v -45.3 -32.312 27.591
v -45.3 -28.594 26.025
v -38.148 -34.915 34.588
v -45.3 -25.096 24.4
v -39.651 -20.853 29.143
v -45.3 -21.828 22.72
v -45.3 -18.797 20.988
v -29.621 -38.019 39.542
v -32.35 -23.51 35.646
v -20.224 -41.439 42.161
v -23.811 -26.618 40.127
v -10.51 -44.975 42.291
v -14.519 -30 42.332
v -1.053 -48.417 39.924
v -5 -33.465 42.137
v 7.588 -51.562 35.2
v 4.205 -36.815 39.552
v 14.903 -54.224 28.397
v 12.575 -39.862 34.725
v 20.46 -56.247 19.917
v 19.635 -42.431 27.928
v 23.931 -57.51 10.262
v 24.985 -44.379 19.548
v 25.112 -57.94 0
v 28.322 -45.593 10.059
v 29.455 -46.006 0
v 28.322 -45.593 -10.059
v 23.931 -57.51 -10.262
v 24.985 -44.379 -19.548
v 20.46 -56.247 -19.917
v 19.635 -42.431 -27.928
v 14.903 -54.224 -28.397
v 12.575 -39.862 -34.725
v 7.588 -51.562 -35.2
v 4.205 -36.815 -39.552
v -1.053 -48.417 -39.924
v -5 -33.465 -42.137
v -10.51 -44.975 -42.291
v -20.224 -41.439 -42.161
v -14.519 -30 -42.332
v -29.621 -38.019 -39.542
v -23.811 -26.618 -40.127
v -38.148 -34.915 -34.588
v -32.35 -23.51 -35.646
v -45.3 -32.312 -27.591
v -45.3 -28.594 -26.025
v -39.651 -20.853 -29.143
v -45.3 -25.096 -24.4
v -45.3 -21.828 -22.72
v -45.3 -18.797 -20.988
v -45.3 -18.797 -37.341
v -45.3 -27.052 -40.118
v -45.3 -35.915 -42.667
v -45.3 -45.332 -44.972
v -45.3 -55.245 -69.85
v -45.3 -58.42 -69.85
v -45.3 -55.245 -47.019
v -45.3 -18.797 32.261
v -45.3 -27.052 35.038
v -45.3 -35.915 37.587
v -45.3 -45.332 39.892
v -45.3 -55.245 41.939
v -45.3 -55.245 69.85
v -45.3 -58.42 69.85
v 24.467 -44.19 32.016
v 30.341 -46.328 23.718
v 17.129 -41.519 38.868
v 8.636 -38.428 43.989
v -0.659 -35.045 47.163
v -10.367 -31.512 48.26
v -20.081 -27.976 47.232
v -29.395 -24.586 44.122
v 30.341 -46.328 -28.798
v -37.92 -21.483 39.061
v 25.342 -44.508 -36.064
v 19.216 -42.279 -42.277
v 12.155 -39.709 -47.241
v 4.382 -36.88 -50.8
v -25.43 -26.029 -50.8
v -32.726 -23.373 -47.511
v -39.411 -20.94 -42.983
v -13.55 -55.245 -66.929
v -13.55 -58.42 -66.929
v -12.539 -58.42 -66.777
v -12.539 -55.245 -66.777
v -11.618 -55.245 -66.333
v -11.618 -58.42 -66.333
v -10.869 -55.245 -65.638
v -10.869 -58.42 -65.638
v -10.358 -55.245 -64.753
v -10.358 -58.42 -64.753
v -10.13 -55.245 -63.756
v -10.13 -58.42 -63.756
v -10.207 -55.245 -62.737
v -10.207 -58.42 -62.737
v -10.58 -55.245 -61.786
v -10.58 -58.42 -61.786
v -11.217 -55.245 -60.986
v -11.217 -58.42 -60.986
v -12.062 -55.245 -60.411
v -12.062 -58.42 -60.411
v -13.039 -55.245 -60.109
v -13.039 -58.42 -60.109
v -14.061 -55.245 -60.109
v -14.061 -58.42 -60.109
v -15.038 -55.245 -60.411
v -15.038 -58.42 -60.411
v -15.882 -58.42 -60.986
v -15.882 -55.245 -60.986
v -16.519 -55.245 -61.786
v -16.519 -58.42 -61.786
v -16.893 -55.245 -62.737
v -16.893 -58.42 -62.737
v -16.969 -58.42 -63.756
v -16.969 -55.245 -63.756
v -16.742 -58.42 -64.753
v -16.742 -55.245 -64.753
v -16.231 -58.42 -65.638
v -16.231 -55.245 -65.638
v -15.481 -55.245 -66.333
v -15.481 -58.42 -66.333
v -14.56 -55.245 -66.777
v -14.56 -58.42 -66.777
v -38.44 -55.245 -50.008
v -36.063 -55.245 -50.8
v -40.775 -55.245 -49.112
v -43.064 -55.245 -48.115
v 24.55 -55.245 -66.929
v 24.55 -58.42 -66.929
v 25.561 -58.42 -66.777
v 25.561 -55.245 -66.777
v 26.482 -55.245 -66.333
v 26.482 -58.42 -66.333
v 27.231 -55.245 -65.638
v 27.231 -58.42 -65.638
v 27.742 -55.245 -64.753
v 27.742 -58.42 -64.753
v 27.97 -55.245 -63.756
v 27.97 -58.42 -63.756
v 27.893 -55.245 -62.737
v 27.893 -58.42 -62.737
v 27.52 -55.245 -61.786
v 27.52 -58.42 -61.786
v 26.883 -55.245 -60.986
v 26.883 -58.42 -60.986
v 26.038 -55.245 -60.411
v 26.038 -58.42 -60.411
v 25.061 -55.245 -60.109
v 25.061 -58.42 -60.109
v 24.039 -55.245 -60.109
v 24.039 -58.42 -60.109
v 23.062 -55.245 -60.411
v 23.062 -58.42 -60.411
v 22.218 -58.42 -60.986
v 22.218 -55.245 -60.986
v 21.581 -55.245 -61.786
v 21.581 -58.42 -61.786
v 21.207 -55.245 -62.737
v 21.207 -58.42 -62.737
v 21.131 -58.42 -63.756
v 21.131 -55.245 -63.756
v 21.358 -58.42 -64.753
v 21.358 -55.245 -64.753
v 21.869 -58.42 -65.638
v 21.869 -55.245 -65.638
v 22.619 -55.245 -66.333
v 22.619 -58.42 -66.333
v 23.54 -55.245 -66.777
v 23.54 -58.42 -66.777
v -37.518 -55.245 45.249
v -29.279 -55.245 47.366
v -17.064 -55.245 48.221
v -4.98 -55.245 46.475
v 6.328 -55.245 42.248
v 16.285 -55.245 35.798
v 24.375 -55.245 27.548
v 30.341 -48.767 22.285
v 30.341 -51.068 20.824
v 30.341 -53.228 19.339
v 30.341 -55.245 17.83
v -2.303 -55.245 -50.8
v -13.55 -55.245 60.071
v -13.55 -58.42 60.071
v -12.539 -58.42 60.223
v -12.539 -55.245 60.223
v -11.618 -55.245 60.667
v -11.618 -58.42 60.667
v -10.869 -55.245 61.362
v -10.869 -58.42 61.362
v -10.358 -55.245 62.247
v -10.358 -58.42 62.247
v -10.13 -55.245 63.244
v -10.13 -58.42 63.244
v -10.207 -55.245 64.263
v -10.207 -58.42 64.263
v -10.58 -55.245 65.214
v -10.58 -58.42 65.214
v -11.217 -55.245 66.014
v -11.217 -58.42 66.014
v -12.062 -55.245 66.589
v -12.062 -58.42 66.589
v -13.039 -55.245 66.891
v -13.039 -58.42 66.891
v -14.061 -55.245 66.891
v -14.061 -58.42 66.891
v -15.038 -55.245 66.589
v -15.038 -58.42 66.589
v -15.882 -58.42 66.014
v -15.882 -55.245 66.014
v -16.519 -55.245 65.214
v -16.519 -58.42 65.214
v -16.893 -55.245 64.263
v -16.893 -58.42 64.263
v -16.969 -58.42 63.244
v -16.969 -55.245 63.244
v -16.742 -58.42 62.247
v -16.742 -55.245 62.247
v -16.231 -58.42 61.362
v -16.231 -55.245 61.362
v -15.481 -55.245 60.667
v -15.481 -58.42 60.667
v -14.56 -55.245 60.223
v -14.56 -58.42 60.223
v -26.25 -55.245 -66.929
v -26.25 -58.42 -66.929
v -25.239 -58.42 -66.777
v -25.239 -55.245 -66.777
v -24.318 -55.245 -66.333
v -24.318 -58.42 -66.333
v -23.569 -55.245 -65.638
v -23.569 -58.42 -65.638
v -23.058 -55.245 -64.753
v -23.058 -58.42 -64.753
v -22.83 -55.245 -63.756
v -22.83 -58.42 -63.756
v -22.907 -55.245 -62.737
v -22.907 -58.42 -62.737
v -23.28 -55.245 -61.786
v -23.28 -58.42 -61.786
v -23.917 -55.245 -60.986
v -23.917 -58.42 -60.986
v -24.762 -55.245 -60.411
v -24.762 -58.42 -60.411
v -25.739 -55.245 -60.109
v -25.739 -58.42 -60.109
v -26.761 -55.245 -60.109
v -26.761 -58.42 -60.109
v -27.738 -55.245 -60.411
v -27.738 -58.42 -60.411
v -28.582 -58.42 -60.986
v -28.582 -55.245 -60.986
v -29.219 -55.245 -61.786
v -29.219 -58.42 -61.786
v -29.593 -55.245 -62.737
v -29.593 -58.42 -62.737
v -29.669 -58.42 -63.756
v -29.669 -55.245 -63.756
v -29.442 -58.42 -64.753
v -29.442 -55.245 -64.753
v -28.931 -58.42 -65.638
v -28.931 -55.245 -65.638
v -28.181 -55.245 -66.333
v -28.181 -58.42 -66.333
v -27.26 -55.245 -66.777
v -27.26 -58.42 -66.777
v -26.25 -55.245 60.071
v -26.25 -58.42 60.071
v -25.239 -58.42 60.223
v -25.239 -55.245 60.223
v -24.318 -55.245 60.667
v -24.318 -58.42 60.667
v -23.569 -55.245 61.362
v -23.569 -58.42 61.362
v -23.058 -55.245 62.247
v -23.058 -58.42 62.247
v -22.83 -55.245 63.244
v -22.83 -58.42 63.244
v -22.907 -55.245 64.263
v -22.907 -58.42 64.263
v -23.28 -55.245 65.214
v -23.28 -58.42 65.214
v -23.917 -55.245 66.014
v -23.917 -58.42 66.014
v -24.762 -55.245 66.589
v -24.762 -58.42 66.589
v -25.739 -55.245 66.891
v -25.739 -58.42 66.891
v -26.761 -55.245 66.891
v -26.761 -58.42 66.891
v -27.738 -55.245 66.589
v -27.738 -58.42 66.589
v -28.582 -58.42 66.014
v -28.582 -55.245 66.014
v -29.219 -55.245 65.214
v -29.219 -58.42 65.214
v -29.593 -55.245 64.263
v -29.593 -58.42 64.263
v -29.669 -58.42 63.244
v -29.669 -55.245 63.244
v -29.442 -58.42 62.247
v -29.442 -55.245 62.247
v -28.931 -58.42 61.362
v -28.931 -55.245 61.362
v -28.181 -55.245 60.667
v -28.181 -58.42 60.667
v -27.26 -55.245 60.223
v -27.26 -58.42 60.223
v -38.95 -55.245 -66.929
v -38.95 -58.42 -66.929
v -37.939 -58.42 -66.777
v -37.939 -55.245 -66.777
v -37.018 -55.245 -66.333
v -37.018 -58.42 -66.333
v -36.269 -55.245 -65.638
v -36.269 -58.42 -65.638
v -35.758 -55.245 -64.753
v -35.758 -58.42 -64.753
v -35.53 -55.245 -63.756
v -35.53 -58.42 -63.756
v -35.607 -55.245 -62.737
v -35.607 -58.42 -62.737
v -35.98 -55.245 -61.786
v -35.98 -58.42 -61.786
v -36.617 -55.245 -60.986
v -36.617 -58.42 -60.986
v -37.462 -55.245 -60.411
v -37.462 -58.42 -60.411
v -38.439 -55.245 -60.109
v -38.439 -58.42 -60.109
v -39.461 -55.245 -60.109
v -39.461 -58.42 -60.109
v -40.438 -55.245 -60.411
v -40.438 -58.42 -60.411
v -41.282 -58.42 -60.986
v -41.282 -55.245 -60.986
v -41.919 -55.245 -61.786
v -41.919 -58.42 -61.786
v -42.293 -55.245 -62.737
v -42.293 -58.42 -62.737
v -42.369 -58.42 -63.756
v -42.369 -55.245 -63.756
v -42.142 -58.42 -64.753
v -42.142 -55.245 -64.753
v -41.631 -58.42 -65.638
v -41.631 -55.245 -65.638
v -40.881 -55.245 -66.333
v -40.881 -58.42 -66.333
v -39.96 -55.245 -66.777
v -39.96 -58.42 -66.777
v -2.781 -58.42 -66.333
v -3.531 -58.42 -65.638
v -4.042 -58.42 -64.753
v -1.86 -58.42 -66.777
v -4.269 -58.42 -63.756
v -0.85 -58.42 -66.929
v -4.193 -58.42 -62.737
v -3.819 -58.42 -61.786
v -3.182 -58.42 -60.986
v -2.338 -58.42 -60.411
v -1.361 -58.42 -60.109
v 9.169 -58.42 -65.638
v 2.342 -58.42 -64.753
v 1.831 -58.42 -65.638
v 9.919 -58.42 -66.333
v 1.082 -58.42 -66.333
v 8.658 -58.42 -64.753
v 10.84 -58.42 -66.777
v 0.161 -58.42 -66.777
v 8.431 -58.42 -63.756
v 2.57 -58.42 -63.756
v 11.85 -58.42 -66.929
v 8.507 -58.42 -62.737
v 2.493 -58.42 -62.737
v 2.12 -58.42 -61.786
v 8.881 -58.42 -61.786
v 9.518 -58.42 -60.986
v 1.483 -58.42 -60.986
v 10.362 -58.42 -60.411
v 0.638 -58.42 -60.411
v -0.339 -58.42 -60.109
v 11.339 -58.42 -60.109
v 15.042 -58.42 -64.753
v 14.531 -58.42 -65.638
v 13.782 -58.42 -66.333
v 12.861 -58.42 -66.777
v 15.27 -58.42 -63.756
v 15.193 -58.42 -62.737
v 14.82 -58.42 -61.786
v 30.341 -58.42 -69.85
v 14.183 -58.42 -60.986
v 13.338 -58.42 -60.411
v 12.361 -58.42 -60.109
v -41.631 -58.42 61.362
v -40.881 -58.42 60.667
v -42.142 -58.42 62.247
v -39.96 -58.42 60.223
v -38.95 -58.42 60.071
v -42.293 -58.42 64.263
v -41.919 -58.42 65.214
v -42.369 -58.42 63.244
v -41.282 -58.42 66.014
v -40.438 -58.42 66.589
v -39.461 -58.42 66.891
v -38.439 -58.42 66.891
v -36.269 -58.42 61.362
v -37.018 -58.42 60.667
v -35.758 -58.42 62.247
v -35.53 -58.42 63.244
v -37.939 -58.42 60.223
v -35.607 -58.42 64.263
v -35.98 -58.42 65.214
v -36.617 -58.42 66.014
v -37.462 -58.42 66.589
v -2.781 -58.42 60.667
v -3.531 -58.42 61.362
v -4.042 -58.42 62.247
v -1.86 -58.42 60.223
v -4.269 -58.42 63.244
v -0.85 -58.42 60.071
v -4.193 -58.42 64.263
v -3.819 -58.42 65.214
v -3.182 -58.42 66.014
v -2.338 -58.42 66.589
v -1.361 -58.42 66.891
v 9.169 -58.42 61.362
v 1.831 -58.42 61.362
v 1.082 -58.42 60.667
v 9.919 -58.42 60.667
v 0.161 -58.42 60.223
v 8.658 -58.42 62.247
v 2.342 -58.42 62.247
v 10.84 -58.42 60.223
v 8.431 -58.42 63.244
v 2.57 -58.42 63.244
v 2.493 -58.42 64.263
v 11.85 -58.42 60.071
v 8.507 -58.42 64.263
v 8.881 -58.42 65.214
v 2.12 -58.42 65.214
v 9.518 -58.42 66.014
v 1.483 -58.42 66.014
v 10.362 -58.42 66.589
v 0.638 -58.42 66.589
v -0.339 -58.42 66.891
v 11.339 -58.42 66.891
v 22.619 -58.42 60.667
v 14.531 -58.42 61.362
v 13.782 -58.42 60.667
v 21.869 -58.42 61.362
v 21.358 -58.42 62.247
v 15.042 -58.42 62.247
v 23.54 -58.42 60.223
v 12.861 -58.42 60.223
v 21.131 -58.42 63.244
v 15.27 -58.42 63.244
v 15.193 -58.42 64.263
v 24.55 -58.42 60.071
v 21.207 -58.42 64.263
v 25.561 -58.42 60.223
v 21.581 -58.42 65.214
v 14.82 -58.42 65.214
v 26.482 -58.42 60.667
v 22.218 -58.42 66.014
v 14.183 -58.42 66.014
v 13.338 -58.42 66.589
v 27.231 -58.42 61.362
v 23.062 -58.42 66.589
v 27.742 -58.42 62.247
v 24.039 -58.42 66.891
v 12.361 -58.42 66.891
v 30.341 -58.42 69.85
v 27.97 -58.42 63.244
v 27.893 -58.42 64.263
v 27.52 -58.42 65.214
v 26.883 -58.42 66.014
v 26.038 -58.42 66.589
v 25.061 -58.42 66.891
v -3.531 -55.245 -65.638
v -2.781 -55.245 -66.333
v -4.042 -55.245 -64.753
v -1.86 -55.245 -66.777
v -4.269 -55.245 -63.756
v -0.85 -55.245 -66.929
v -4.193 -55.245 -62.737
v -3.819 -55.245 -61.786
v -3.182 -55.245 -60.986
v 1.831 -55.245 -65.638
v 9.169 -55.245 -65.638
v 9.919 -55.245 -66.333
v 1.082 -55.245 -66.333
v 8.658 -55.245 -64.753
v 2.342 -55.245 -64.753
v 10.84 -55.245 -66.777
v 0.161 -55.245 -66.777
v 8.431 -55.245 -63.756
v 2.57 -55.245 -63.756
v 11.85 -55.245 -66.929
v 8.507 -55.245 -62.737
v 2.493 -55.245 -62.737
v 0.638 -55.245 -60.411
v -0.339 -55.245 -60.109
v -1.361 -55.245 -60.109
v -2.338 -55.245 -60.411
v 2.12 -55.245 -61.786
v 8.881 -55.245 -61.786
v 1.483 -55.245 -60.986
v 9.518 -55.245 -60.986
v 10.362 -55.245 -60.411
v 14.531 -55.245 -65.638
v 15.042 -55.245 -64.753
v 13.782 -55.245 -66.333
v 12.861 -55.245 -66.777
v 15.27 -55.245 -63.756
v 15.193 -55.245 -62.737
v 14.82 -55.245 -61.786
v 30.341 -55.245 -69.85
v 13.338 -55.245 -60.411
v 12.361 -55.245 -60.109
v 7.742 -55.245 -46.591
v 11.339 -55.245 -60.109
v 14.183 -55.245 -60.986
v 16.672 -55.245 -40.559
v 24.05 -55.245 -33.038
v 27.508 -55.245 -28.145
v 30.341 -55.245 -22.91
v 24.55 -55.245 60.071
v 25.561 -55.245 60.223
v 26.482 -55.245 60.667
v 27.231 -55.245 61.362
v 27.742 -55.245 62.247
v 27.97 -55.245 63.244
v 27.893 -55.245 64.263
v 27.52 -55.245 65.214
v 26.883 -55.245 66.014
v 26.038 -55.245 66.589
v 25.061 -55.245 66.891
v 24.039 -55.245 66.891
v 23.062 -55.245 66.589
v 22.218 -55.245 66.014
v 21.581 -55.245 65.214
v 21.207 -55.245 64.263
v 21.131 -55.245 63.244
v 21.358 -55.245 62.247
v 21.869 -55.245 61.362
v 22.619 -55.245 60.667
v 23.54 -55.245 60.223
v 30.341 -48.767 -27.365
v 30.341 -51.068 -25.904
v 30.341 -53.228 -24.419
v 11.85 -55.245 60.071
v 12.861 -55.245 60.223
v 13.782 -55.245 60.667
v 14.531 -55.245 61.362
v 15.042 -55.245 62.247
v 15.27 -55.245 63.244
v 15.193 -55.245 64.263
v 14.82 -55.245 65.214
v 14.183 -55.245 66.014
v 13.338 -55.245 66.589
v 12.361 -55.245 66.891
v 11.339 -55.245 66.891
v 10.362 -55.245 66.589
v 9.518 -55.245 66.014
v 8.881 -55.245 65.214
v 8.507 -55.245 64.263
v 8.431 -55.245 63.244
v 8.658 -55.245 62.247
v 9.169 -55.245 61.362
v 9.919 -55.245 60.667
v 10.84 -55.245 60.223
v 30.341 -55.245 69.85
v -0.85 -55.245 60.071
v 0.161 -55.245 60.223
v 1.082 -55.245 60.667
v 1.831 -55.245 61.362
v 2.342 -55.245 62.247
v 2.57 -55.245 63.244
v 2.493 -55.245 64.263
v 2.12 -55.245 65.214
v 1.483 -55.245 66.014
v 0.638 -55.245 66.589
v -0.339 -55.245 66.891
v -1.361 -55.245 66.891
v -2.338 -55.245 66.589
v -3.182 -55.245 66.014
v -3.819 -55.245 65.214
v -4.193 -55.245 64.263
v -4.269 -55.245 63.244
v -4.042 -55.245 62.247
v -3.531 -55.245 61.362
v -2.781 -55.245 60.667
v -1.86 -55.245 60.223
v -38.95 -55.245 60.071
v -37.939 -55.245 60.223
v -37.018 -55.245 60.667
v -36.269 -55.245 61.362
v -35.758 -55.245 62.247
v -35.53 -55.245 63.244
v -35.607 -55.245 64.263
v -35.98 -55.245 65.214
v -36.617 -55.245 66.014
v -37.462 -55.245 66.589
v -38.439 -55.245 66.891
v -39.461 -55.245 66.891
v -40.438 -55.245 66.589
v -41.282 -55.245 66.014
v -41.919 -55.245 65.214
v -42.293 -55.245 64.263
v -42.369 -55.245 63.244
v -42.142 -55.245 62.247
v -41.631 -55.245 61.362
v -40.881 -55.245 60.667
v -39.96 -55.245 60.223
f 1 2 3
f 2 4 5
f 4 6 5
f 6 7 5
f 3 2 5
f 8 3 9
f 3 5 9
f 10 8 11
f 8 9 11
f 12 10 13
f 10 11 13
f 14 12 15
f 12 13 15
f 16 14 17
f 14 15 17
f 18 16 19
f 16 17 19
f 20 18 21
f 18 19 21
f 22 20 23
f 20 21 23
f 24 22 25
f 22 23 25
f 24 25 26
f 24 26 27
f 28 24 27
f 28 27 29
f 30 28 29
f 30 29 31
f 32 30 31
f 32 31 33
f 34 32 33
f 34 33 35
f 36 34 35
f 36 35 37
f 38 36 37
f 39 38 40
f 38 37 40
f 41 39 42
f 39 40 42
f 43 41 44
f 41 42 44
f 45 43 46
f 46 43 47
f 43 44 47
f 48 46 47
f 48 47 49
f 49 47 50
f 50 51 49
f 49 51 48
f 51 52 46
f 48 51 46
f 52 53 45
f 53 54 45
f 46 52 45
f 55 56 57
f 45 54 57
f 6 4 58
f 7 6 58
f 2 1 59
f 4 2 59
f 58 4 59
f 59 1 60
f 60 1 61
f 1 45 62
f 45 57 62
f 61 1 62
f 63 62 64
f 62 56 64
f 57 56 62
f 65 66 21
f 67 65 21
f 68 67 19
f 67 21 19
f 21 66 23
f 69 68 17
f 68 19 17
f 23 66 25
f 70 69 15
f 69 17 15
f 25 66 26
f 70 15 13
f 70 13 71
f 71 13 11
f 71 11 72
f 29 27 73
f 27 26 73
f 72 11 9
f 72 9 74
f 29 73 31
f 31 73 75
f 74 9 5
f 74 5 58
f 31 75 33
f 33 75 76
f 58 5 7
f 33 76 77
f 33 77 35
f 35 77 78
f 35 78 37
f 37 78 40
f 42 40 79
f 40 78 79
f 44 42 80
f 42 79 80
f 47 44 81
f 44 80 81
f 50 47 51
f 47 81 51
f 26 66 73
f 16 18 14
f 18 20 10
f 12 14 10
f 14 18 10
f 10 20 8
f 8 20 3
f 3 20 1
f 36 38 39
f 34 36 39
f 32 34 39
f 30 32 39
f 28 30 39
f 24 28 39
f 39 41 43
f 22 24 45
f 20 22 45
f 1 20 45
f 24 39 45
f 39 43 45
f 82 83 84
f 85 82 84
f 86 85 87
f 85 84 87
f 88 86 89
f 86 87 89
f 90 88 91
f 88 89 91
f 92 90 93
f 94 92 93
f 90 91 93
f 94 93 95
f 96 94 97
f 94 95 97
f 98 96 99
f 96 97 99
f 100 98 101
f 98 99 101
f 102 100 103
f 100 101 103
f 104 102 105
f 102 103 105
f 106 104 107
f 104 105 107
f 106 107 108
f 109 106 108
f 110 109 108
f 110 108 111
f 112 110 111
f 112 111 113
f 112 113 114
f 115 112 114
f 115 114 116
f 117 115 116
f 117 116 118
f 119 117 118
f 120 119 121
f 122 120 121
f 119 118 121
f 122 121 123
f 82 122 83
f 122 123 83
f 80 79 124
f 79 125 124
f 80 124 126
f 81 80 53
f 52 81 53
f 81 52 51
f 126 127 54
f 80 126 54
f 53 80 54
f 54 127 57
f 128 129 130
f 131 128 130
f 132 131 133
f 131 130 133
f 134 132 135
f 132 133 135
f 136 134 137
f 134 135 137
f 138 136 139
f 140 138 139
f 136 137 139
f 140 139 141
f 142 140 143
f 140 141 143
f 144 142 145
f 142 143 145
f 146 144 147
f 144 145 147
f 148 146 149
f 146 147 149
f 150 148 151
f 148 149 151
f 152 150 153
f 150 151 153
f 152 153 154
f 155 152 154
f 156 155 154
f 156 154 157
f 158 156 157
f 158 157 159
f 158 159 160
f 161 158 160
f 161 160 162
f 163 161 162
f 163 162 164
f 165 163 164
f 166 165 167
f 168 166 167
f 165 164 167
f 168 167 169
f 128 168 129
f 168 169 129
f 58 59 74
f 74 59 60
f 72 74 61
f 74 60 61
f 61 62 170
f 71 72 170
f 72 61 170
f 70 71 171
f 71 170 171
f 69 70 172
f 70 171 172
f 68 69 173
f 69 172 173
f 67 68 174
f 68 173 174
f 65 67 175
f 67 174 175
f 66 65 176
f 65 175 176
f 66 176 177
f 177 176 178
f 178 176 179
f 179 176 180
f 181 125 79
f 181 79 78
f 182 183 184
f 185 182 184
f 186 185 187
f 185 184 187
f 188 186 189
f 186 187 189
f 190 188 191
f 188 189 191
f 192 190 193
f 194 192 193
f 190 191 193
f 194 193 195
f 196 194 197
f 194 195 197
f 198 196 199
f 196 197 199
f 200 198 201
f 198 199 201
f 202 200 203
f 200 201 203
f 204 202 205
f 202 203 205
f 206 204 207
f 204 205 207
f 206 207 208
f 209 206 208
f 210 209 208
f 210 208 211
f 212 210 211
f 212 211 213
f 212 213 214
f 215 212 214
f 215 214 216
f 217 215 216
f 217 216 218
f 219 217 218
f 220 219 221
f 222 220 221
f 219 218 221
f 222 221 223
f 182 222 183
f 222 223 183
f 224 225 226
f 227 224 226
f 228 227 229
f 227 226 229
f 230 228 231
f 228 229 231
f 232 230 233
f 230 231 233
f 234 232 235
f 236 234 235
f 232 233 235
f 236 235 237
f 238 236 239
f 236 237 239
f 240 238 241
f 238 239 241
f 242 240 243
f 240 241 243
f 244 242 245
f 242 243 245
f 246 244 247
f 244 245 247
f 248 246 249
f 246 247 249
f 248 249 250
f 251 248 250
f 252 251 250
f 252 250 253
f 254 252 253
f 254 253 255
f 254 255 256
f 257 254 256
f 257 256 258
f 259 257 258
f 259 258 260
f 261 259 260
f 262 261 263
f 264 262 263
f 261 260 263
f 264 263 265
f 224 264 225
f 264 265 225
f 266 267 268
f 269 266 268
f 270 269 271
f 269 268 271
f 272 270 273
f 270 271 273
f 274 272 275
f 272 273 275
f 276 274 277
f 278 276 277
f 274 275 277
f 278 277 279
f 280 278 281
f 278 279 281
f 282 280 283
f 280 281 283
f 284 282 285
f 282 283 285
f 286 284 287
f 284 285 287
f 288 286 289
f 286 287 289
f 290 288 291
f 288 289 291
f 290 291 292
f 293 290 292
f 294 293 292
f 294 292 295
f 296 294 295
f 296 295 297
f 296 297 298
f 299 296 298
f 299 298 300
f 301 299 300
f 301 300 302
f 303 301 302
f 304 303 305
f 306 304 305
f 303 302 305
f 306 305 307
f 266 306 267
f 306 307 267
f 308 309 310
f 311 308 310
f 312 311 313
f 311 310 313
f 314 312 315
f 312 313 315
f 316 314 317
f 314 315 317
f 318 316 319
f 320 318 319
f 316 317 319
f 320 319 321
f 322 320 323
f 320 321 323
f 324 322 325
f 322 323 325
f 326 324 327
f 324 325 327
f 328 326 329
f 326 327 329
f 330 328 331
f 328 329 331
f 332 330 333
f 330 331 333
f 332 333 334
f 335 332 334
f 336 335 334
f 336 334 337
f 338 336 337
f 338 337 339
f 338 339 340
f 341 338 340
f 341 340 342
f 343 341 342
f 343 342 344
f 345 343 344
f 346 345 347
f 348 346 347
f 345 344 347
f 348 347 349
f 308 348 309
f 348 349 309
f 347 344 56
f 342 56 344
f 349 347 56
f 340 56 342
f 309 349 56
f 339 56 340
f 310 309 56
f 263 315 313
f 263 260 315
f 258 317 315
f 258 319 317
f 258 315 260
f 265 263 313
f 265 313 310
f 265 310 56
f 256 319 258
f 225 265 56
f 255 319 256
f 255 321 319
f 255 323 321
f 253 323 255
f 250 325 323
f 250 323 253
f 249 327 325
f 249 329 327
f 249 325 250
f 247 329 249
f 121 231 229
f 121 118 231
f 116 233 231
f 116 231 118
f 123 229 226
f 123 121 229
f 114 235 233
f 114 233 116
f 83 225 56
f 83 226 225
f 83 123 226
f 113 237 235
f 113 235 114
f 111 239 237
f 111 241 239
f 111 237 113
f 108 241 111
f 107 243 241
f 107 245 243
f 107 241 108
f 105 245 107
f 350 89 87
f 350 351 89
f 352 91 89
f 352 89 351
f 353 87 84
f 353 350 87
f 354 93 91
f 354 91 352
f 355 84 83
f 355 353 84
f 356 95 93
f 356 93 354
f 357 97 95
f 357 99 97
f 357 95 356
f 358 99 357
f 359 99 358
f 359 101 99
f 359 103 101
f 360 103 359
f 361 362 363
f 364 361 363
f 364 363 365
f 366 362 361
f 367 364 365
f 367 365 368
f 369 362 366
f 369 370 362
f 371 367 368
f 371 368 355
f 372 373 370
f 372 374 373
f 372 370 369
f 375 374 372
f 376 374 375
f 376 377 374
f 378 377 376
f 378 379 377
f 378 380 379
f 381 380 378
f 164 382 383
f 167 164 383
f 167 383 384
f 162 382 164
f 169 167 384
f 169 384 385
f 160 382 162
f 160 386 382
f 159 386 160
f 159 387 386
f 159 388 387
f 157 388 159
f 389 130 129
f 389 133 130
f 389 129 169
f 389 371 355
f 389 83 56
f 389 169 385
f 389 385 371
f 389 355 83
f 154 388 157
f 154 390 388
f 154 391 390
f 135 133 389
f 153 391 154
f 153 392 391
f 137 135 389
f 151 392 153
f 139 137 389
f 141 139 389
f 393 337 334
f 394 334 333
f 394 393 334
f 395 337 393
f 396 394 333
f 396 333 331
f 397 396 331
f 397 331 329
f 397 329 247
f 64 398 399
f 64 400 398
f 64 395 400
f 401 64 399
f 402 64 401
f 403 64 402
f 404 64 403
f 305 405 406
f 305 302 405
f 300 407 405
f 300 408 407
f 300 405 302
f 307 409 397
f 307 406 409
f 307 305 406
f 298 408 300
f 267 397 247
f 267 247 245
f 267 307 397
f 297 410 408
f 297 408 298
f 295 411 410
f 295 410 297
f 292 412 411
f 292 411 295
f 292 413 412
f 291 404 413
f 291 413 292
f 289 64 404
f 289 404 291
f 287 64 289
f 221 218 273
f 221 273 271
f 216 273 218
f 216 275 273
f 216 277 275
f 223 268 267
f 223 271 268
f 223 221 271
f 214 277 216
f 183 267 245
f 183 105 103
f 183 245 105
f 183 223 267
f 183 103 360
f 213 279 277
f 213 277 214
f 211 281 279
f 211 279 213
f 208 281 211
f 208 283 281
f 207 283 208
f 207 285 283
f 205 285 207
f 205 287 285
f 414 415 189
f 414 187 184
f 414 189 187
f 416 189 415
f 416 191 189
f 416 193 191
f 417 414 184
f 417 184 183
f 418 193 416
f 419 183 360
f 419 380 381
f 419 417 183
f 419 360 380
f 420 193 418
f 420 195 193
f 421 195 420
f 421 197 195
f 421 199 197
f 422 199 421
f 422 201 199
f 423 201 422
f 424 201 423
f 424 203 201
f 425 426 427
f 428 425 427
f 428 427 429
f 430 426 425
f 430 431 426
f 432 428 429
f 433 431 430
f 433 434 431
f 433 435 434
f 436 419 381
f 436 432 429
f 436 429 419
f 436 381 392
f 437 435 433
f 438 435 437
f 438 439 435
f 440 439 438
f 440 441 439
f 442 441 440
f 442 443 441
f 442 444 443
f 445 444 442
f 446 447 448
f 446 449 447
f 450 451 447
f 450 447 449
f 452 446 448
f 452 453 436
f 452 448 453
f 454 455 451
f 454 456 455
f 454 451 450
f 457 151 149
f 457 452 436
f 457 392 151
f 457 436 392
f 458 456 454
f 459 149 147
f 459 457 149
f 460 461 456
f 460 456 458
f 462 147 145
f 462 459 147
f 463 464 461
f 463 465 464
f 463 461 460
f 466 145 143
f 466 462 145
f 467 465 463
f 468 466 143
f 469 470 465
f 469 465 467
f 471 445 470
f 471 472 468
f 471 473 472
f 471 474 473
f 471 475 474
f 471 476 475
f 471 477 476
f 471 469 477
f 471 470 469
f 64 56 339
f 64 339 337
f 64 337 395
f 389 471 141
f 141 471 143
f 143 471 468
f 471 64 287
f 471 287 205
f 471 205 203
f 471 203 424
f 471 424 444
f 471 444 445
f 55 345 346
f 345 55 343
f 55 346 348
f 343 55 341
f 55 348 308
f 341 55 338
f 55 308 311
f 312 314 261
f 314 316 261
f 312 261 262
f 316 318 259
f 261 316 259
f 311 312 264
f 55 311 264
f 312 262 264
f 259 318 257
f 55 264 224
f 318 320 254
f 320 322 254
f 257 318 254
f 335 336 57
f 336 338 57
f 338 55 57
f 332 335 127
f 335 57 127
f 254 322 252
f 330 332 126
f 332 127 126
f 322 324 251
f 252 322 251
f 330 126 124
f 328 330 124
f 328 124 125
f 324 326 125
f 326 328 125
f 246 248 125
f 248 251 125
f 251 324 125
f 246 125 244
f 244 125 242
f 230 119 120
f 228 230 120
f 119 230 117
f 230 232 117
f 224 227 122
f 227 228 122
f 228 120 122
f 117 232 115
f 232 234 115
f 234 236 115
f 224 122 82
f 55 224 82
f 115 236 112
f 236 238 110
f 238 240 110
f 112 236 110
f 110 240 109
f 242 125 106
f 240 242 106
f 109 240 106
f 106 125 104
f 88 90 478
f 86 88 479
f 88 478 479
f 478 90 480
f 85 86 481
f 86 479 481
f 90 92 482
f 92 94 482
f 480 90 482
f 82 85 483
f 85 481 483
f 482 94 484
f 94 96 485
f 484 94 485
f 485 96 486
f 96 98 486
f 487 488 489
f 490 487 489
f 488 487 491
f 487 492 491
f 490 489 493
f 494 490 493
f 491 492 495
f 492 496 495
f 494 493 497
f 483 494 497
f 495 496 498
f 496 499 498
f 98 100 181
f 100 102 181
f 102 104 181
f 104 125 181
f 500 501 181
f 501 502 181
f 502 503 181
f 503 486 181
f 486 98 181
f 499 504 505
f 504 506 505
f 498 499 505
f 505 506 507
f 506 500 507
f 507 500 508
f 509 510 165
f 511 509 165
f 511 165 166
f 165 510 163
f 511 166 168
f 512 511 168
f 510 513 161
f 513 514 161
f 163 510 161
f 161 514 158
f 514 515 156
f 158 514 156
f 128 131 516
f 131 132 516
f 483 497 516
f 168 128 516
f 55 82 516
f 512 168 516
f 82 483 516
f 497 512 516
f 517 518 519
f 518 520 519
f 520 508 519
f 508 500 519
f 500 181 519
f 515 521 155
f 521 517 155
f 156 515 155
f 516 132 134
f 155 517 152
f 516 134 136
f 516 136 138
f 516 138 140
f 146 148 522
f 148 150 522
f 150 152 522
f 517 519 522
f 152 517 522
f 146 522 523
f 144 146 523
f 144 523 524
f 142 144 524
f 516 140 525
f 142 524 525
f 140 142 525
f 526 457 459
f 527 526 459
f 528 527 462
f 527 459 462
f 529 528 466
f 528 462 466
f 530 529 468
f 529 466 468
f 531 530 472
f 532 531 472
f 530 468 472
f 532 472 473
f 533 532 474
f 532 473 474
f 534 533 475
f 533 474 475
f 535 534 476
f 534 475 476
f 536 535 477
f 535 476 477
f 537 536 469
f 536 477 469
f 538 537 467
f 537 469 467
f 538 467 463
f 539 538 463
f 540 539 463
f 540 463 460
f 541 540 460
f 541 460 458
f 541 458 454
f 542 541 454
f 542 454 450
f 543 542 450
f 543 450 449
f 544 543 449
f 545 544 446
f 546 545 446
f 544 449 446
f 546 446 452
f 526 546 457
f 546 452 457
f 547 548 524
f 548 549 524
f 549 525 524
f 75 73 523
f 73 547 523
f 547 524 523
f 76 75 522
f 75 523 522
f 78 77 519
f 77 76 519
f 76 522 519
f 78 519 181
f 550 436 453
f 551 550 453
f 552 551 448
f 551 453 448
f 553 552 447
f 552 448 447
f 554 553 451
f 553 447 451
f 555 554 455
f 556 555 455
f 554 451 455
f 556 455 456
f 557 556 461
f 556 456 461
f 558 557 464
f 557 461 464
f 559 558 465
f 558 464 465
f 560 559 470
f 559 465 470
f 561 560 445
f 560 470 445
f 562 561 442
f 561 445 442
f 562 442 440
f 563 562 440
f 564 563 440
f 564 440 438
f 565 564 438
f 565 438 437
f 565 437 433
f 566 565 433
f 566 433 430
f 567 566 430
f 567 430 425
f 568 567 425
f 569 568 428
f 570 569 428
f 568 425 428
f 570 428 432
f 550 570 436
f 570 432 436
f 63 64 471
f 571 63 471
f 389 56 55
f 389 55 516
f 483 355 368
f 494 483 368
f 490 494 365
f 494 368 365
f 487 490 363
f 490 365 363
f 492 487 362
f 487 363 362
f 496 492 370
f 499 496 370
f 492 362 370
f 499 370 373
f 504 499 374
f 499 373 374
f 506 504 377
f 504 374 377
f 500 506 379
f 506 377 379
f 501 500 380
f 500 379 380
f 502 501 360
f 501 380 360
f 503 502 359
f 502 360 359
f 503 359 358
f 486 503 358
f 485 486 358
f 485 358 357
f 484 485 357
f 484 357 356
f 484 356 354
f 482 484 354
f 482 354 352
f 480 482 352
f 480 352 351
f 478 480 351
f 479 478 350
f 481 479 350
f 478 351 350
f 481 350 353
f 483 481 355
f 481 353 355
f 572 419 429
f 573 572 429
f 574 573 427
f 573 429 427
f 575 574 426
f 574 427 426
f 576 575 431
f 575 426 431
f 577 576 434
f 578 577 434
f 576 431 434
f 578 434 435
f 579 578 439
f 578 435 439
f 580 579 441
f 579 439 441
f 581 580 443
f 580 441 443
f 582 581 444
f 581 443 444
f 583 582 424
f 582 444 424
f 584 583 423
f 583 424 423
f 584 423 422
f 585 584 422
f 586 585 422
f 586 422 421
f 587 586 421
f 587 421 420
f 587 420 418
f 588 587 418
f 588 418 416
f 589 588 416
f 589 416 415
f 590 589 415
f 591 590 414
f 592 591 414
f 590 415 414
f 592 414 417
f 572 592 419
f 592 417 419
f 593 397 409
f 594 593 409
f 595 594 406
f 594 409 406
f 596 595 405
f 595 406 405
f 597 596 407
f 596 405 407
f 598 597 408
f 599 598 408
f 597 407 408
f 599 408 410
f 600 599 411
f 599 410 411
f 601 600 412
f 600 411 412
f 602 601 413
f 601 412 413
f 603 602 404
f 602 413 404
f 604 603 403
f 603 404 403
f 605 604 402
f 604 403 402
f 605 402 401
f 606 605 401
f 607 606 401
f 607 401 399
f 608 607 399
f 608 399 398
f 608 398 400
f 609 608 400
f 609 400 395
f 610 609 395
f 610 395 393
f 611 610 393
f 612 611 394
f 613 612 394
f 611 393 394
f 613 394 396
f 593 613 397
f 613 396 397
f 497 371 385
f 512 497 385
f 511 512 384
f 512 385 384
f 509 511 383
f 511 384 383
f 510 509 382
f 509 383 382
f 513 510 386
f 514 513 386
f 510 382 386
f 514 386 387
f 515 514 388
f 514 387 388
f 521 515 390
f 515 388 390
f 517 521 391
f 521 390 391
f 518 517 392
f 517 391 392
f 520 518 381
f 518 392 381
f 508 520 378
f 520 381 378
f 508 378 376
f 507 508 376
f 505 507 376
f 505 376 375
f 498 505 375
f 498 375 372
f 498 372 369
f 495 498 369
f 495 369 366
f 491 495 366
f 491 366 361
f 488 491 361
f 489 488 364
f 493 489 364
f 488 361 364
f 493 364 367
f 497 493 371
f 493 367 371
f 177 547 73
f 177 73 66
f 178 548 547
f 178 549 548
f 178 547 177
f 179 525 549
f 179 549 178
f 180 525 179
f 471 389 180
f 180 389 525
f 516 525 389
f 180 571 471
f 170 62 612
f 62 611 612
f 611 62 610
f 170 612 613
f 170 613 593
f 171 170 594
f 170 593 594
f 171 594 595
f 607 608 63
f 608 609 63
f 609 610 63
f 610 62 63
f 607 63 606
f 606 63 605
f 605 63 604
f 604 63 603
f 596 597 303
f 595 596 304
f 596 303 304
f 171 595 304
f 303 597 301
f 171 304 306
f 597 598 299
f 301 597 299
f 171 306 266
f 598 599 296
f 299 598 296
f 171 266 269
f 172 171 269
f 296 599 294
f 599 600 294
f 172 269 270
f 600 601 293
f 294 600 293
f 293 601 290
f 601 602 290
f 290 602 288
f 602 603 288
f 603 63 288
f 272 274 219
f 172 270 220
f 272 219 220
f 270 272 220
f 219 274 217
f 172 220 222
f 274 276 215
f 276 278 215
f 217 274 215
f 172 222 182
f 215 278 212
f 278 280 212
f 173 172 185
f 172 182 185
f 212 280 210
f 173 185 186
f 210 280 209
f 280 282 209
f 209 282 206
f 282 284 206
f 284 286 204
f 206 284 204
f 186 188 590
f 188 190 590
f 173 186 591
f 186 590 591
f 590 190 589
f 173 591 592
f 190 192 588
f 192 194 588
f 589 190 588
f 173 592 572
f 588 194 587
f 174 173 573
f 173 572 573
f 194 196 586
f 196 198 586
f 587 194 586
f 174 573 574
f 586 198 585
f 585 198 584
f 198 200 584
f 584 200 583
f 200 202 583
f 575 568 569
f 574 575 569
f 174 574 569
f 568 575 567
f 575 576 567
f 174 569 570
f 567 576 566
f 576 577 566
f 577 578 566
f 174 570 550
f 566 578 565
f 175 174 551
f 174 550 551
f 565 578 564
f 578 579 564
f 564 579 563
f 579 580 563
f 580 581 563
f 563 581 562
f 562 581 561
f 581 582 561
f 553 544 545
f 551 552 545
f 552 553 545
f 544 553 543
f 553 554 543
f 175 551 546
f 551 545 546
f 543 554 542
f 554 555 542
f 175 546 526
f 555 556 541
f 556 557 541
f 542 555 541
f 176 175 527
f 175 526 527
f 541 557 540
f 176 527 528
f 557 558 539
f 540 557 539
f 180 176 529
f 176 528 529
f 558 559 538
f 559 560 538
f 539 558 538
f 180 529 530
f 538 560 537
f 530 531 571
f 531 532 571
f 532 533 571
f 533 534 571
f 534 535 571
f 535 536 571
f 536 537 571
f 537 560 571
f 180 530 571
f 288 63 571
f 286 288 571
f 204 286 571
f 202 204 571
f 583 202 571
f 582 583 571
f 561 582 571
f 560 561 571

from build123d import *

# Parameters (mm, degrees)
SKETCH1_W                = 228.6
SKETCH1_H                = 127
BOSS_EXTRUDE1_DEPTH      = 50.8
CUT_EXTRUDE24_DEPTH      = 196.514014843
CUT_EXTRUDE24_DEPTH_BACK = 196.514014843
SKETCH30_W               = 94.400264643
SKETCH30_H               = 127
SKETCH30_W_2             = 58.559389051
SKETCH31_W               = 75.640346306
SKETCH31_H               = 101.6
CUT_EXTRUDE25_DEPTH      = 68.58
CUT_EXTRUDE26_DEPTH      = 73.726300143
CUT_EXTRUDE26_DEPTH_BACK = 73.726300143
SKETCH32_OUTSIDE_W       = 113.175
SKETCH32_OUTSIDE_H       = 130.144
SKETCH32_OUTSIDE_R       = 50.8
SKETCH34_W               = 90.599470714
SKETCH34_H               = 139.7
SKETCH34_R               = 3.429
BOSS_EXTRUDE2_DEPTH      = 3.175
CUT_EXTRUDE28_DEPTH      = 91.882042278
CUT_EXTRUDE28_DEPTH_BACK = 91.882042278


with BuildPart() as part:
    # Sketch1 → Boss-Extrude1 (new, symmetric)
    with BuildSketch(Plane.XY):
        with Locations((-25.4, -63.5)):
            Rectangle(SKETCH1_W, SKETCH1_H)
    extrude(amount=BOSS_EXTRUDE1_DEPTH, both=True)

    # Sketch2 → Cut-Revolve1 (revolve, cut)
    with BuildSketch(Plane.XY, mode=Mode.PRIVATE) as cut_revolve1_sk:
        Polygon((-50.503182361, -16.903094944), (-105.996730082, 3.29490462), (-55.183426739, 142.903308162), (40.289343532, 108.1540616), (0, -2.54), (-14.86761563, -43.388438226), (-54.846838182, -28.837191228), align=None)
    revolve(cut_revolve1_sk.sketch.rotate(Axis((-60.4239625, -168.553472561, 0), (0.3420201433256656, 0.9396926207859095, 0)), 180), axis=Axis((-60.4239625, -168.553472561, 0), (0.3420201433256656, 0.9396926207859095, 0)), mode=Mode.SUBTRACT)

    # Sketch30 → Cut-Extrude24 (cut, two sides: drawn at the far end of the back side and taken through both)
    with BuildSketch(Plane.XY.offset(-CUT_EXTRUDE24_DEPTH_BACK)):
        with Locations((-92.499867679, -63.5)):
            Rectangle(SKETCH30_W, SKETCH30_H)
        with Locations((59.620305475, -63.5)):
            Rectangle(SKETCH30_W_2, SKETCH30_H)
    extrude(amount=CUT_EXTRUDE24_DEPTH + CUT_EXTRUDE24_DEPTH_BACK, mode=Mode.SUBTRACT)

    # Sketch31 → Cut-Extrude25 (cut)
    with BuildSketch(Plane.XZ.offset(127)):
        with Locations((-7.479562204, 0)):
            Rectangle(SKETCH31_W, SKETCH31_H)
    extrude(amount=-CUT_EXTRUDE25_DEPTH, mode=Mode.SUBTRACT)

    # Sketch32 outside → Cut-Extrude26 (cut, two sides: drawn at the far end of the back side and taken through both)
    with BuildSketch(Plane(origin=(-15.683955895, -43.091314668, 0), x_dir=(0.9396926207859096, -0.3420201433256657, 0), z_dir=(0.3420201433256657, 0.9396926207859096, 0)).offset(-CUT_EXTRUDE26_DEPTH_BACK)):
        with Locations((6.1765, 0)):
            Rectangle(SKETCH32_OUTSIDE_W, SKETCH32_OUTSIDE_H)
        with Locations((0.868731164, 2.54)):
            Circle(SKETCH32_OUTSIDE_R, mode=Mode.SUBTRACT)
    extrude(amount=CUT_EXTRUDE26_DEPTH + CUT_EXTRUDE26_DEPTH_BACK, mode=Mode.SUBTRACT)

    # Sketch34 → Boss-Extrude2 (add)
    with BuildSketch(Plane.XZ.offset(58.42)):
        Rectangle(SKETCH34_W, SKETCH34_H)
        with Locations(Location((-38.949735357, 63.5, 0), (0, 0, 270))):
            Circle(SKETCH34_R, mode=Mode.SUBTRACT)
        with Locations(Location((-26.249735357, 63.5, 0), (0, 0, 270))):
            Circle(SKETCH34_R, mode=Mode.SUBTRACT)
        with Locations(Location((-13.549735357, 63.5, 0), (0, 0, 270))):
            Circle(SKETCH34_R, mode=Mode.SUBTRACT)
        with Locations(Location((-0.849735357, 63.5, 0), (0, 0, 270))):
            Circle(SKETCH34_R, mode=Mode.SUBTRACT)
        with Locations(Location((11.850264643, 63.5, 0), (0, 0, 270))):
            Circle(SKETCH34_R, mode=Mode.SUBTRACT)
        with Locations(Location((24.550264643, 63.5, 0), (0, 0, 270))):
            Circle(SKETCH34_R, mode=Mode.SUBTRACT)
        with Locations(Location((-26.249735357, -63.5, 0), (0, 0, 270))):
            Circle(SKETCH34_R, mode=Mode.SUBTRACT)
        with Locations(Location((-13.549735357, -63.5, 0), (0, 0, 270))):
            Circle(SKETCH34_R, mode=Mode.SUBTRACT)
        with Locations(Location((-0.849735357, -63.5, 0), (0, 0, 270))):
            Circle(SKETCH34_R, mode=Mode.SUBTRACT)
        with Locations(Location((11.850264643, -63.5, 0), (0, 0, 270))):
            Circle(SKETCH34_R, mode=Mode.SUBTRACT)
        with Locations(Location((24.550264643, -63.5, 0), (0, 0, 270))):
            Circle(SKETCH34_R, mode=Mode.SUBTRACT)
        with Locations(Location((-38.949735357, -63.5, 0), (0, 0, 270))):
            Circle(SKETCH34_R, mode=Mode.SUBTRACT)
        Polygon((8.18326415, 23.631227188), (17.570519416, 30.368097404), (24.550264643, 23.631227188), (27.611749682, 8.577894095), (26.081007163, -20.911612947), (15.410103284, -35.988916053), (9.99990449, -28.4502645), align=None, mode=Mode.SUBTRACT)
    extrude(amount=-BOSS_EXTRUDE2_DEPTH)

    # Sketch35 → Cut-Extrude28 (cut, two sides: drawn at the far end of the back side and taken through both)
    with BuildSketch(Plane(origin=(0, -55.245, 0), x_dir=(1, 0, 0), z_dir=(0, 1, 0)).offset(-CUT_EXTRUDE28_DEPTH_BACK)):
        Polygon((30.340610949, 28.79845063), (30.340610949, 69.85), (45.299735357, 69.85), (45.299735357, -69.85), (30.340610949, -69.85), align=None)
    extrude(amount=CUT_EXTRUDE28_DEPTH + CUT_EXTRUDE28_DEPTH_BACK, mode=Mode.SUBTRACT)


solid = part.part
